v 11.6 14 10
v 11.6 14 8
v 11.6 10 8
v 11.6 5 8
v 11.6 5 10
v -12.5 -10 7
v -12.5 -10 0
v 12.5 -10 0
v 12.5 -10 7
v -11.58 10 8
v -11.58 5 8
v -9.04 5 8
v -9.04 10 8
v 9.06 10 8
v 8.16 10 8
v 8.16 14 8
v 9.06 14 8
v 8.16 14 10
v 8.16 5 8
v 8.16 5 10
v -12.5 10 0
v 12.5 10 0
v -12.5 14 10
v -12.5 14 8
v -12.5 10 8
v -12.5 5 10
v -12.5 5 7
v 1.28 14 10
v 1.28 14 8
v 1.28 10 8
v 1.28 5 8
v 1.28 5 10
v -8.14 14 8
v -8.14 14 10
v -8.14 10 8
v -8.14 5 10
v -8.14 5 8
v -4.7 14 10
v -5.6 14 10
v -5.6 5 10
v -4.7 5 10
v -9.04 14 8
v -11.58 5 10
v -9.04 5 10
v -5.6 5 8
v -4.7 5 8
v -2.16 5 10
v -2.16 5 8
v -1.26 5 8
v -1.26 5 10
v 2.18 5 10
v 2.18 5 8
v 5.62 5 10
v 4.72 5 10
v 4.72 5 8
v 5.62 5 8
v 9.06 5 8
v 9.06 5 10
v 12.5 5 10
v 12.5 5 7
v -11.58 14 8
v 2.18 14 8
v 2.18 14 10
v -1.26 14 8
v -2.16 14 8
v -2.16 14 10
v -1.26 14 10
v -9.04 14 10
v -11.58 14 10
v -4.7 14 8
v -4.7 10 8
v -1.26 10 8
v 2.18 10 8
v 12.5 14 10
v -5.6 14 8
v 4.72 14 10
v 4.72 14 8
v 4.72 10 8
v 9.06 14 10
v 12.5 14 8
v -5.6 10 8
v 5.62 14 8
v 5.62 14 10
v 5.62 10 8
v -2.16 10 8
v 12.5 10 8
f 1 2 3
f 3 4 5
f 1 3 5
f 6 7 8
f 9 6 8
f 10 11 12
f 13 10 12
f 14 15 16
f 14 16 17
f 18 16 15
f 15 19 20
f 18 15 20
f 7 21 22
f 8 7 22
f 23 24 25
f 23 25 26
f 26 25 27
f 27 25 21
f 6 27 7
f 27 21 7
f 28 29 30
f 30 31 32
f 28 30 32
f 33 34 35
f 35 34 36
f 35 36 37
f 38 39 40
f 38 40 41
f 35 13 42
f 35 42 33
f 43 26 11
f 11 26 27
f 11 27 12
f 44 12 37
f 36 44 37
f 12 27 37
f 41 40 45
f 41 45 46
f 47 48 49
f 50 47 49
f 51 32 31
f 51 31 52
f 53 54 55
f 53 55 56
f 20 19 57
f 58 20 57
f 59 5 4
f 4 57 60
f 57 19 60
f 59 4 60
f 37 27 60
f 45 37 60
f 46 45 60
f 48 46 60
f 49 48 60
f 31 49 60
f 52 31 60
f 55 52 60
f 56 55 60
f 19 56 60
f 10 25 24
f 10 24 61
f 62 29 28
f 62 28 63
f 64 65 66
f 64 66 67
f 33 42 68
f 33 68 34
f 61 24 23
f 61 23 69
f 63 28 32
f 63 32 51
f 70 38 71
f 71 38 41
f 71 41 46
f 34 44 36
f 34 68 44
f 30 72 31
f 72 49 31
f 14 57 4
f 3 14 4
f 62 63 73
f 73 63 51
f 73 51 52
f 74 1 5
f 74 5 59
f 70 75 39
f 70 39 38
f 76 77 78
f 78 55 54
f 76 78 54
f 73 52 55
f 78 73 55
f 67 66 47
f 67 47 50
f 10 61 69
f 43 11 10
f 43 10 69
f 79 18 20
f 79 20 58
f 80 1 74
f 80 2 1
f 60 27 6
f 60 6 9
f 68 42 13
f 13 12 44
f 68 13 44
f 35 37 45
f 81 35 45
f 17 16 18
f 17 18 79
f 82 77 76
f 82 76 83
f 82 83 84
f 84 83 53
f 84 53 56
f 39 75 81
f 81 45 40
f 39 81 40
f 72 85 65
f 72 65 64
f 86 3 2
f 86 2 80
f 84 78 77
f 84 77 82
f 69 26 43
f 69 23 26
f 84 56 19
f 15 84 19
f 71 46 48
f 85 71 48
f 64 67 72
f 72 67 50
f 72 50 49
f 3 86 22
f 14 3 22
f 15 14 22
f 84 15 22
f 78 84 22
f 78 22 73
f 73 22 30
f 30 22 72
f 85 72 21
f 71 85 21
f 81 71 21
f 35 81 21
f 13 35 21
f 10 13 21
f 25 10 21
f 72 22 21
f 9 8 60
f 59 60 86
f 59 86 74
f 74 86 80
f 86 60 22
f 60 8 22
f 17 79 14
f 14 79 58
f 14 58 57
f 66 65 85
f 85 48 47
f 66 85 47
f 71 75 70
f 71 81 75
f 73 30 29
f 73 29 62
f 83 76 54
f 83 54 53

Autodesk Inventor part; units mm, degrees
ref_plane "YZ Plane" through (0, 0, 0) normal (1, 0, 0) x (0, 1, 0)
ref_plane "XZ Plane" through (0, 0, 0) normal (0, 1, 0) x (-1, 0, 0)
ref_plane "XY Plane" through (0, 0, 0) normal (0, 0, 1) x (1, 0, 0)
sketch "Esquisse1" plane through (0, 0, 0) normal (0, 0, 1) x (1, 0, 0)
  line L0 (-12.5, -10) -> (12.5, -10)
  line L1 (12.5, -10) -> (12.5, 10)
  line L2 (12.5, 10) -> (-12.5, 10)
  line L3 (-12.5, 10) -> (-12.5, -10)
  line L4 (-12.5, -10) -> (12.5, 10) construction
  line L5 (12.5, -10) -> (-12.5, 10) construction
  point P0 (0, 0)
  dimension "d0" = 25
  dimension "d1" = 20
extrude "Extrusion1" add sketch "Esquisse1" along normal blind 7
sketch "Esquisse2" plane through (0, 0, 7) normal (0, 0, 1) x (1, 0, 0)
  line L0 (12.5, -10) -> (12.5, 10) projected
  line L1 (-12.5, 10) -> (-12.5, -10) projected
  line L2 (12.5, 10) -> (-12.5, 10)
  line L3 (-12.5, 10) -> (-12.5, 5)
  line L4 (-12.5, 5) -> (12.5, 5)
  line L5 (12.5, 5) -> (12.5, 10)
  point P0 (0, 0)
  point P1 (12.5, 5)
  dimension "d4" = 5
extrude "Extrusion2" add sketch "Esquisse2" along normal blind 3
sketch "Esquisse3" plane through (-12.5, 10, 0) normal (0, 1, 0) x (1, 0, 0)
  line L0 (25, 0) -> (25, -10) projected
  line L1 (25, -10) -> (24.1, -10)
  line L2 (24.1, -10) -> (24.1, -8)
  line L3 (24.1, -8) -> (25, -8)
  line L4 (25, -8) -> (25, -10)
  line L5 (24.1, -10) -> (21.56, -10)
  line L6 (25, -10) -> (0, -10) projected
  line L7 (21.56, -10) -> (16.1469, -10)
  line L8 (21.56, -10) -> (20.66, -10)
  line L9 (20.66, -10) -> (20.66, -8)
  line L10 (20.66, -8) -> (21.56, -8)
  line L11 (21.56, -8) -> (21.56, -10)
  line L12 (20.66, -10) -> (18.12, -10)
  line L13 (18.12, -10) -> (17.22, -10)
  line L14 (17.22, -10) -> (17.22, -8)
  line L15 (17.22, -8) -> (18.12, -8)
  line L16 (18.12, -8) -> (18.12, -10)
  line L17 (17.22, -10) -> (14.68, -10)
  line L18 (14.68, -10) -> (13.78, -10)
  line L19 (13.78, -10) -> (13.78, -8)
  line L20 (13.78, -8) -> (14.68, -8)
  line L21 (14.68, -8) -> (14.68, -10)
  line L22 (13.78, -10) -> (11.24, -10)
  line L23 (11.24, -10) -> (10.34, -10)
  line L24 (10.34, -10) -> (10.34, -8)
  line L25 (10.34, -8) -> (11.24, -8)
  line L26 (11.24, -8) -> (11.24, -10)
  line L27 (10.34, -10) -> (7.8, -10)
  line L28 (7.8, -10) -> (6.9, -10)
  line L29 (6.9, -10) -> (6.9, -8)
  line L30 (6.9, -8) -> (7.8, -8)
  line L31 (7.8, -8) -> (7.8, -10)
  line L32 (6.9, -10) -> (4.36, -10)
  line L33 (4.36, -10) -> (3.46, -10)
  line L34 (3.46, -10) -> (3.46, -8)
  line L35 (3.46, -8) -> (4.36, -8)
  line L36 (4.36, -8) -> (4.36, -10)
  line L37 (3.46, -10) -> (0.92, -10)
  line L38 (0.92, -10) -> (0.02, -10)
  line L39 (0.02, -8) -> (0.92, -8)
  line L40 (0.92, -8) -> (0.92, -10)
  line L41 (0, -10) -> (0, -8)
  line L42 (0, -8) -> (0.02, -8)
  point P0 (12.5, 0)
  point P1 (3.46, -10)
  point P2 (4.36, -10)
  point P3 (6.9, -10)
  point P4 (7.8, -10)
  dimension "d7" = 2.54
  dimension "d11" = 0.9
  dimension "d12" = 2
  dimension "d13" = 2.54
  dimension "d14" = 0.9
  dimension "d15" = 2
  dimension "d16" = 2.54
  dimension "d17" = 0.9
  dimension "d18" = 2
  dimension "d19" = 2.54
  dimension "d20" = 0.9
  dimension "d21" = 2
  dimension "d22" = 2.54
  dimension "d23" = 0.9
  dimension "d24" = 2
  dimension "d25" = 2.54
  dimension "d26" = 0.9
  dimension "d27" = 2
  dimension "d28" = 2.54
  dimension "d29" = 0.9
  dimension "d30" = 2
  dimension "d33" = 2
extrude "Extrusion3" add sketch "Esquisse3" along normal blind 4
sketch "Esquisse4" plane through (-12.5, 10, 0) normal (0, 1, 0) x (1, 0, 0)
  line L0 (25, -7) -> (25, -10) projected
  line L1 (25, -10) -> (24.1, -10)
  line L2 (0, -10) -> (25, -10) projected
  line L3 (24.1, -10) -> (21.56, -10)
  line L4 (21.56, -10) -> (21.56, -8)
  line L5 (21.56, -8) -> (24.1, -8)
  line L6 (24.1, -8) -> (24.1, -10)
  line L7 (21.56, -10) -> (20.66, -10)
  line L8 (20.66, -10) -> (18.12, -10)
  line L9 (18.12, -10) -> (18.12, -8)
  line L10 (18.12, -8) -> (20.66, -8)
  line L11 (20.66, -8) -> (20.66, -10)
  line L12 (18.12, -10) -> (17.22, -10)
  line L13 (17.22, -10) -> (14.68, -10)
  line L14 (14.68, -10) -> (14.68, -8)
  line L15 (14.68, -8) -> (17.22, -8)
  line L16 (17.22, -8) -> (17.22, -10)
  line L17 (14.68, -10) -> (13.78, -10)
  line L18 (13.78, -10) -> (11.24, -10)
  line L19 (11.24, -10) -> (11.24, -8)
  line L20 (11.24, -8) -> (13.78, -8)
  line L21 (13.78, -8) -> (13.78, -10)
  line L22 (11.24, -10) -> (10.34, -10)
  line L23 (10.34, -10) -> (7.8, -10)
  line L24 (7.8, -10) -> (7.8, -8)
  line L25 (7.8, -8) -> (10.34, -8)
  line L26 (10.34, -8) -> (10.34, -10)
  line L27 (7.8, -10) -> (6.9, -10)
  line L28 (6.9, -10) -> (4.36, -10)
  line L29 (4.36, -10) -> (4.36, -8)
  line L30 (4.36, -8) -> (6.9, -8)
  line L31 (6.9, -8) -> (6.9, -10)
  line L32 (4.36, -10) -> (3.46, -10)
  line L33 (3.46, -10) -> (0.92, -10)
  line L34 (0.92, -10) -> (0.92, -8)
  line L35 (0.92, -8) -> (3.46, -8)
  line L36 (3.46, -8) -> (3.46, -10)
  point P0 (12.5, 0)
  point P1 (3.46, -10)
  point P2 (4.36, -10)
  point P3 (6.9, -10)
  point P4 (7.8, -10)
  dimension "d36" = 0.9
  dimension "d37" = 2.54
  dimension "d38" = 2
  dimension "d39" = 0.9
  dimension "d40" = 2.54
  dimension "d41" = 2
  dimension "d42" = 0.9
  dimension "d43" = 2.54
  dimension "d44" = 2
  dimension "d45" = 0.9
  dimension "d46" = 2.54
  dimension "d47" = 2
  dimension "d48" = 0.9
  dimension "d49" = 2.54
  dimension "d50" = 2
  dimension "d51" = 0.9
  dimension "d52" = 2.54
  dimension "d53" = 2
  dimension "d54" = 0.9
  dimension "d55" = 2.54
  dimension "d56" = 2
extrude "Extrusion4" cut sketch "Esquisse4" along normal through all both and the other way through all
properties part number "Gyroscope MPU6050"
